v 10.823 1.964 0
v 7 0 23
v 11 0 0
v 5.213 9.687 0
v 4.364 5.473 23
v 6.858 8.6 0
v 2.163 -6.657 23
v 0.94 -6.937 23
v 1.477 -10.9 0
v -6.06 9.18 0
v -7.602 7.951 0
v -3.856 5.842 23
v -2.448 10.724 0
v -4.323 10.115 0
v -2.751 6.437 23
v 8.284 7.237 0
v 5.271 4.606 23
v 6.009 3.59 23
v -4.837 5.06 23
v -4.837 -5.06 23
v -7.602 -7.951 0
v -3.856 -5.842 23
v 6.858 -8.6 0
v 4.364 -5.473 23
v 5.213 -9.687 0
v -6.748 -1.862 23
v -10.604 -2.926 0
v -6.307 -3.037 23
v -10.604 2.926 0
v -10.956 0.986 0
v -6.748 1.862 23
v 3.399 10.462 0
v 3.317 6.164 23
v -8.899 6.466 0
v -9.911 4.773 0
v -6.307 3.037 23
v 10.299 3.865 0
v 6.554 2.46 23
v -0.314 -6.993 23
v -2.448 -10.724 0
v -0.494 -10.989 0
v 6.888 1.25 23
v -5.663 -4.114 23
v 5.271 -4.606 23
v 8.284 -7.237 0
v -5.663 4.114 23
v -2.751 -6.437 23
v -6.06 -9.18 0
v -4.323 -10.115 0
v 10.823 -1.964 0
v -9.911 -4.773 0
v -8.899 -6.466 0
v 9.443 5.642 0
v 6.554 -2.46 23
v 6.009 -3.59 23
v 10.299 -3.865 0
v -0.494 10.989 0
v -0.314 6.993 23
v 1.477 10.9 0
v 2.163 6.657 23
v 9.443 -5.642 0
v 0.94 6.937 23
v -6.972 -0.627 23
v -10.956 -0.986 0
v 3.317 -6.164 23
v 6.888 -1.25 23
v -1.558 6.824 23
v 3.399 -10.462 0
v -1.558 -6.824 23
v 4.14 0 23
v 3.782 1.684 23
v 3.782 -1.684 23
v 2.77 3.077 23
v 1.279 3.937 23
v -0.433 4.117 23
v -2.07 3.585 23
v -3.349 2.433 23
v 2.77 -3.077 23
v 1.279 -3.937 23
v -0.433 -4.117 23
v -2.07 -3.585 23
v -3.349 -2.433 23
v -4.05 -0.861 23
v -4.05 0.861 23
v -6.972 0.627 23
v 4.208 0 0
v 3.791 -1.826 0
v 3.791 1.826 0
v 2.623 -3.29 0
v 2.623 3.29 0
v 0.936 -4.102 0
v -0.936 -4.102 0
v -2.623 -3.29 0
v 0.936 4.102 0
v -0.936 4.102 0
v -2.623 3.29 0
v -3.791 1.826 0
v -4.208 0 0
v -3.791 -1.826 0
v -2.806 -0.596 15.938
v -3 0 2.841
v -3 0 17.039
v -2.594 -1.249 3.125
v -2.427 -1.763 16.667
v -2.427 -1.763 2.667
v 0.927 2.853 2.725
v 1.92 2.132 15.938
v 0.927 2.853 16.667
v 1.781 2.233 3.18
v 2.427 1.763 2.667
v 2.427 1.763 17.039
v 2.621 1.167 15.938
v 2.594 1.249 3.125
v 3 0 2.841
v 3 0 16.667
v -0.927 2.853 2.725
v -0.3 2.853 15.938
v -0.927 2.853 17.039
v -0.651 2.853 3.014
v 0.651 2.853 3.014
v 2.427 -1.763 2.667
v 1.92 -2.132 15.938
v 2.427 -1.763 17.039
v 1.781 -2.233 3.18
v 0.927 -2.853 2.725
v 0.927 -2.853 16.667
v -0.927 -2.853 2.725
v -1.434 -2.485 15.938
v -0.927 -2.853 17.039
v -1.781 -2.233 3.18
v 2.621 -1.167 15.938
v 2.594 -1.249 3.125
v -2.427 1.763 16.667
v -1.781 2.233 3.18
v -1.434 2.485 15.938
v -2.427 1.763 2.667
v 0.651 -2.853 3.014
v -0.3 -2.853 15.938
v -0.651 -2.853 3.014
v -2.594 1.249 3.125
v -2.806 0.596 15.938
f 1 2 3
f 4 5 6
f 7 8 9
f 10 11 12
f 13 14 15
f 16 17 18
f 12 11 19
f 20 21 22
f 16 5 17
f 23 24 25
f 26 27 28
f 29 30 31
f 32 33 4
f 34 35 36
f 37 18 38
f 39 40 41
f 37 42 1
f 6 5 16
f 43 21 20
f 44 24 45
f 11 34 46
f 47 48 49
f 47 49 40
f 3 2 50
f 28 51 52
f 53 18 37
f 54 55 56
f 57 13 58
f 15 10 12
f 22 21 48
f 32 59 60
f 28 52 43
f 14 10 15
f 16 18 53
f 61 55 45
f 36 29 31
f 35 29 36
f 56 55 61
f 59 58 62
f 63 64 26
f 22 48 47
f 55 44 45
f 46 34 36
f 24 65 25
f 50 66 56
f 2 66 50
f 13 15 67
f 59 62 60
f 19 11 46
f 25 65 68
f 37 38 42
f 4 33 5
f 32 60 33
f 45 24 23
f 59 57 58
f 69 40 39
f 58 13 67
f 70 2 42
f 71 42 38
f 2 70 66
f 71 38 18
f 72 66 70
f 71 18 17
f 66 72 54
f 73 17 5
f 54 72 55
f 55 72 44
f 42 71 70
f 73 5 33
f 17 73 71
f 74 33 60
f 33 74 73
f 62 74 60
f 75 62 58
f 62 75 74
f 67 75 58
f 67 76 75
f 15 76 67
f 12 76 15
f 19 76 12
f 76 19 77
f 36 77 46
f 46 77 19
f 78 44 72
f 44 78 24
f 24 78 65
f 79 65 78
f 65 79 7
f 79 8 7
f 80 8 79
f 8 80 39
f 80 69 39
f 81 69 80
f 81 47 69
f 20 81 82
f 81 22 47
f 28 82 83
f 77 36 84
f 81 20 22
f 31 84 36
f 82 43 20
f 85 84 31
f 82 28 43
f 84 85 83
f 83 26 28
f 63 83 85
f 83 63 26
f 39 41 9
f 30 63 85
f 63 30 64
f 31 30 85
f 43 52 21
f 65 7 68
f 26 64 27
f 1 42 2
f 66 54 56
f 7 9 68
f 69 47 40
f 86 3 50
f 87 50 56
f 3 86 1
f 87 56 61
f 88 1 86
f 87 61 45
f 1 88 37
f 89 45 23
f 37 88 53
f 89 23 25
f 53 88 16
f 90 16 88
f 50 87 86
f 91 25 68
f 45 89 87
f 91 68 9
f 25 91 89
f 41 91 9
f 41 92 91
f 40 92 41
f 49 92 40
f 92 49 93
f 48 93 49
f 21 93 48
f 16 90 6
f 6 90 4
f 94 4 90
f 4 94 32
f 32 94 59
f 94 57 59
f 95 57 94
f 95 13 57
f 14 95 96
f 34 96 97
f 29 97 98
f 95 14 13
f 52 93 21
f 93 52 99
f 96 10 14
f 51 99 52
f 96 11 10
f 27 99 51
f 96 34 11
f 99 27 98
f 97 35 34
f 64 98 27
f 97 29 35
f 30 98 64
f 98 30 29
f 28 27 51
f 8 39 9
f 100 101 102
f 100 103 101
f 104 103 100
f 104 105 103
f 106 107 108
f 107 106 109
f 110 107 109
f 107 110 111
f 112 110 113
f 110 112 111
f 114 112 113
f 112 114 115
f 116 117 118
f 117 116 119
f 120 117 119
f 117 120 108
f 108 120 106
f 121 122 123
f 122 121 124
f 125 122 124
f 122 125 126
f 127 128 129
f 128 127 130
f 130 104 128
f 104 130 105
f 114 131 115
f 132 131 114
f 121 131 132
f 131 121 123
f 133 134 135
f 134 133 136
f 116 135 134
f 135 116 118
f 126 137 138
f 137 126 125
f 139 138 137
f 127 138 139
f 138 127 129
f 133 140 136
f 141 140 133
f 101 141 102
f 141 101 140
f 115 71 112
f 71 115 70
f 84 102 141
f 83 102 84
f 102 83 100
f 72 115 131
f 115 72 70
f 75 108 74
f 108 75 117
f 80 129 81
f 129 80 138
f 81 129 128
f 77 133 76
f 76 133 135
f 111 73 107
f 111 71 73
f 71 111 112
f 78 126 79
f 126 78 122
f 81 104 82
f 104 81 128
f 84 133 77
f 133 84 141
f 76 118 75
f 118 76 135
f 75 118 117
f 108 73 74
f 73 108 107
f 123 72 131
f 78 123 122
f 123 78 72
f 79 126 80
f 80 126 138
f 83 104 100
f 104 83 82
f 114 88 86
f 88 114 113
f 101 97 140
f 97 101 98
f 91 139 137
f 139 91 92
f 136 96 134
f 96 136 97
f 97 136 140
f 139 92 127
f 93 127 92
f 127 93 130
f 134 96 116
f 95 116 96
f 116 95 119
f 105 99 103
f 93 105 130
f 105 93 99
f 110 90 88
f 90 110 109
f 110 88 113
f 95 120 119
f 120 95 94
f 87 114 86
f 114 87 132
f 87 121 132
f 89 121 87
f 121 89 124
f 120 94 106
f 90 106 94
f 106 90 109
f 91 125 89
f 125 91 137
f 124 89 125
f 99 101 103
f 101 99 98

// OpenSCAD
lens_diameter = 22;
lens_opening = 8.5;
top_diameter = 14;
fiber_hole_diam = 6;
guide_opening = 9;
height = 23;
$fs=2;
$fa=1;
difference() {
  cylinder(r1=lens_diameter/2, r2=top_diameter/2, h=height);
  translate([0,0,-1]) cylinder(r=fiber_hole_diam/2, h=height+2);
  cylinder(r1=0, r2=guide_opening/2, h=height+2);
  translate([0,0,-0.1]) cylinder(r1=lens_opening/2, r2=0, h=10);
}
